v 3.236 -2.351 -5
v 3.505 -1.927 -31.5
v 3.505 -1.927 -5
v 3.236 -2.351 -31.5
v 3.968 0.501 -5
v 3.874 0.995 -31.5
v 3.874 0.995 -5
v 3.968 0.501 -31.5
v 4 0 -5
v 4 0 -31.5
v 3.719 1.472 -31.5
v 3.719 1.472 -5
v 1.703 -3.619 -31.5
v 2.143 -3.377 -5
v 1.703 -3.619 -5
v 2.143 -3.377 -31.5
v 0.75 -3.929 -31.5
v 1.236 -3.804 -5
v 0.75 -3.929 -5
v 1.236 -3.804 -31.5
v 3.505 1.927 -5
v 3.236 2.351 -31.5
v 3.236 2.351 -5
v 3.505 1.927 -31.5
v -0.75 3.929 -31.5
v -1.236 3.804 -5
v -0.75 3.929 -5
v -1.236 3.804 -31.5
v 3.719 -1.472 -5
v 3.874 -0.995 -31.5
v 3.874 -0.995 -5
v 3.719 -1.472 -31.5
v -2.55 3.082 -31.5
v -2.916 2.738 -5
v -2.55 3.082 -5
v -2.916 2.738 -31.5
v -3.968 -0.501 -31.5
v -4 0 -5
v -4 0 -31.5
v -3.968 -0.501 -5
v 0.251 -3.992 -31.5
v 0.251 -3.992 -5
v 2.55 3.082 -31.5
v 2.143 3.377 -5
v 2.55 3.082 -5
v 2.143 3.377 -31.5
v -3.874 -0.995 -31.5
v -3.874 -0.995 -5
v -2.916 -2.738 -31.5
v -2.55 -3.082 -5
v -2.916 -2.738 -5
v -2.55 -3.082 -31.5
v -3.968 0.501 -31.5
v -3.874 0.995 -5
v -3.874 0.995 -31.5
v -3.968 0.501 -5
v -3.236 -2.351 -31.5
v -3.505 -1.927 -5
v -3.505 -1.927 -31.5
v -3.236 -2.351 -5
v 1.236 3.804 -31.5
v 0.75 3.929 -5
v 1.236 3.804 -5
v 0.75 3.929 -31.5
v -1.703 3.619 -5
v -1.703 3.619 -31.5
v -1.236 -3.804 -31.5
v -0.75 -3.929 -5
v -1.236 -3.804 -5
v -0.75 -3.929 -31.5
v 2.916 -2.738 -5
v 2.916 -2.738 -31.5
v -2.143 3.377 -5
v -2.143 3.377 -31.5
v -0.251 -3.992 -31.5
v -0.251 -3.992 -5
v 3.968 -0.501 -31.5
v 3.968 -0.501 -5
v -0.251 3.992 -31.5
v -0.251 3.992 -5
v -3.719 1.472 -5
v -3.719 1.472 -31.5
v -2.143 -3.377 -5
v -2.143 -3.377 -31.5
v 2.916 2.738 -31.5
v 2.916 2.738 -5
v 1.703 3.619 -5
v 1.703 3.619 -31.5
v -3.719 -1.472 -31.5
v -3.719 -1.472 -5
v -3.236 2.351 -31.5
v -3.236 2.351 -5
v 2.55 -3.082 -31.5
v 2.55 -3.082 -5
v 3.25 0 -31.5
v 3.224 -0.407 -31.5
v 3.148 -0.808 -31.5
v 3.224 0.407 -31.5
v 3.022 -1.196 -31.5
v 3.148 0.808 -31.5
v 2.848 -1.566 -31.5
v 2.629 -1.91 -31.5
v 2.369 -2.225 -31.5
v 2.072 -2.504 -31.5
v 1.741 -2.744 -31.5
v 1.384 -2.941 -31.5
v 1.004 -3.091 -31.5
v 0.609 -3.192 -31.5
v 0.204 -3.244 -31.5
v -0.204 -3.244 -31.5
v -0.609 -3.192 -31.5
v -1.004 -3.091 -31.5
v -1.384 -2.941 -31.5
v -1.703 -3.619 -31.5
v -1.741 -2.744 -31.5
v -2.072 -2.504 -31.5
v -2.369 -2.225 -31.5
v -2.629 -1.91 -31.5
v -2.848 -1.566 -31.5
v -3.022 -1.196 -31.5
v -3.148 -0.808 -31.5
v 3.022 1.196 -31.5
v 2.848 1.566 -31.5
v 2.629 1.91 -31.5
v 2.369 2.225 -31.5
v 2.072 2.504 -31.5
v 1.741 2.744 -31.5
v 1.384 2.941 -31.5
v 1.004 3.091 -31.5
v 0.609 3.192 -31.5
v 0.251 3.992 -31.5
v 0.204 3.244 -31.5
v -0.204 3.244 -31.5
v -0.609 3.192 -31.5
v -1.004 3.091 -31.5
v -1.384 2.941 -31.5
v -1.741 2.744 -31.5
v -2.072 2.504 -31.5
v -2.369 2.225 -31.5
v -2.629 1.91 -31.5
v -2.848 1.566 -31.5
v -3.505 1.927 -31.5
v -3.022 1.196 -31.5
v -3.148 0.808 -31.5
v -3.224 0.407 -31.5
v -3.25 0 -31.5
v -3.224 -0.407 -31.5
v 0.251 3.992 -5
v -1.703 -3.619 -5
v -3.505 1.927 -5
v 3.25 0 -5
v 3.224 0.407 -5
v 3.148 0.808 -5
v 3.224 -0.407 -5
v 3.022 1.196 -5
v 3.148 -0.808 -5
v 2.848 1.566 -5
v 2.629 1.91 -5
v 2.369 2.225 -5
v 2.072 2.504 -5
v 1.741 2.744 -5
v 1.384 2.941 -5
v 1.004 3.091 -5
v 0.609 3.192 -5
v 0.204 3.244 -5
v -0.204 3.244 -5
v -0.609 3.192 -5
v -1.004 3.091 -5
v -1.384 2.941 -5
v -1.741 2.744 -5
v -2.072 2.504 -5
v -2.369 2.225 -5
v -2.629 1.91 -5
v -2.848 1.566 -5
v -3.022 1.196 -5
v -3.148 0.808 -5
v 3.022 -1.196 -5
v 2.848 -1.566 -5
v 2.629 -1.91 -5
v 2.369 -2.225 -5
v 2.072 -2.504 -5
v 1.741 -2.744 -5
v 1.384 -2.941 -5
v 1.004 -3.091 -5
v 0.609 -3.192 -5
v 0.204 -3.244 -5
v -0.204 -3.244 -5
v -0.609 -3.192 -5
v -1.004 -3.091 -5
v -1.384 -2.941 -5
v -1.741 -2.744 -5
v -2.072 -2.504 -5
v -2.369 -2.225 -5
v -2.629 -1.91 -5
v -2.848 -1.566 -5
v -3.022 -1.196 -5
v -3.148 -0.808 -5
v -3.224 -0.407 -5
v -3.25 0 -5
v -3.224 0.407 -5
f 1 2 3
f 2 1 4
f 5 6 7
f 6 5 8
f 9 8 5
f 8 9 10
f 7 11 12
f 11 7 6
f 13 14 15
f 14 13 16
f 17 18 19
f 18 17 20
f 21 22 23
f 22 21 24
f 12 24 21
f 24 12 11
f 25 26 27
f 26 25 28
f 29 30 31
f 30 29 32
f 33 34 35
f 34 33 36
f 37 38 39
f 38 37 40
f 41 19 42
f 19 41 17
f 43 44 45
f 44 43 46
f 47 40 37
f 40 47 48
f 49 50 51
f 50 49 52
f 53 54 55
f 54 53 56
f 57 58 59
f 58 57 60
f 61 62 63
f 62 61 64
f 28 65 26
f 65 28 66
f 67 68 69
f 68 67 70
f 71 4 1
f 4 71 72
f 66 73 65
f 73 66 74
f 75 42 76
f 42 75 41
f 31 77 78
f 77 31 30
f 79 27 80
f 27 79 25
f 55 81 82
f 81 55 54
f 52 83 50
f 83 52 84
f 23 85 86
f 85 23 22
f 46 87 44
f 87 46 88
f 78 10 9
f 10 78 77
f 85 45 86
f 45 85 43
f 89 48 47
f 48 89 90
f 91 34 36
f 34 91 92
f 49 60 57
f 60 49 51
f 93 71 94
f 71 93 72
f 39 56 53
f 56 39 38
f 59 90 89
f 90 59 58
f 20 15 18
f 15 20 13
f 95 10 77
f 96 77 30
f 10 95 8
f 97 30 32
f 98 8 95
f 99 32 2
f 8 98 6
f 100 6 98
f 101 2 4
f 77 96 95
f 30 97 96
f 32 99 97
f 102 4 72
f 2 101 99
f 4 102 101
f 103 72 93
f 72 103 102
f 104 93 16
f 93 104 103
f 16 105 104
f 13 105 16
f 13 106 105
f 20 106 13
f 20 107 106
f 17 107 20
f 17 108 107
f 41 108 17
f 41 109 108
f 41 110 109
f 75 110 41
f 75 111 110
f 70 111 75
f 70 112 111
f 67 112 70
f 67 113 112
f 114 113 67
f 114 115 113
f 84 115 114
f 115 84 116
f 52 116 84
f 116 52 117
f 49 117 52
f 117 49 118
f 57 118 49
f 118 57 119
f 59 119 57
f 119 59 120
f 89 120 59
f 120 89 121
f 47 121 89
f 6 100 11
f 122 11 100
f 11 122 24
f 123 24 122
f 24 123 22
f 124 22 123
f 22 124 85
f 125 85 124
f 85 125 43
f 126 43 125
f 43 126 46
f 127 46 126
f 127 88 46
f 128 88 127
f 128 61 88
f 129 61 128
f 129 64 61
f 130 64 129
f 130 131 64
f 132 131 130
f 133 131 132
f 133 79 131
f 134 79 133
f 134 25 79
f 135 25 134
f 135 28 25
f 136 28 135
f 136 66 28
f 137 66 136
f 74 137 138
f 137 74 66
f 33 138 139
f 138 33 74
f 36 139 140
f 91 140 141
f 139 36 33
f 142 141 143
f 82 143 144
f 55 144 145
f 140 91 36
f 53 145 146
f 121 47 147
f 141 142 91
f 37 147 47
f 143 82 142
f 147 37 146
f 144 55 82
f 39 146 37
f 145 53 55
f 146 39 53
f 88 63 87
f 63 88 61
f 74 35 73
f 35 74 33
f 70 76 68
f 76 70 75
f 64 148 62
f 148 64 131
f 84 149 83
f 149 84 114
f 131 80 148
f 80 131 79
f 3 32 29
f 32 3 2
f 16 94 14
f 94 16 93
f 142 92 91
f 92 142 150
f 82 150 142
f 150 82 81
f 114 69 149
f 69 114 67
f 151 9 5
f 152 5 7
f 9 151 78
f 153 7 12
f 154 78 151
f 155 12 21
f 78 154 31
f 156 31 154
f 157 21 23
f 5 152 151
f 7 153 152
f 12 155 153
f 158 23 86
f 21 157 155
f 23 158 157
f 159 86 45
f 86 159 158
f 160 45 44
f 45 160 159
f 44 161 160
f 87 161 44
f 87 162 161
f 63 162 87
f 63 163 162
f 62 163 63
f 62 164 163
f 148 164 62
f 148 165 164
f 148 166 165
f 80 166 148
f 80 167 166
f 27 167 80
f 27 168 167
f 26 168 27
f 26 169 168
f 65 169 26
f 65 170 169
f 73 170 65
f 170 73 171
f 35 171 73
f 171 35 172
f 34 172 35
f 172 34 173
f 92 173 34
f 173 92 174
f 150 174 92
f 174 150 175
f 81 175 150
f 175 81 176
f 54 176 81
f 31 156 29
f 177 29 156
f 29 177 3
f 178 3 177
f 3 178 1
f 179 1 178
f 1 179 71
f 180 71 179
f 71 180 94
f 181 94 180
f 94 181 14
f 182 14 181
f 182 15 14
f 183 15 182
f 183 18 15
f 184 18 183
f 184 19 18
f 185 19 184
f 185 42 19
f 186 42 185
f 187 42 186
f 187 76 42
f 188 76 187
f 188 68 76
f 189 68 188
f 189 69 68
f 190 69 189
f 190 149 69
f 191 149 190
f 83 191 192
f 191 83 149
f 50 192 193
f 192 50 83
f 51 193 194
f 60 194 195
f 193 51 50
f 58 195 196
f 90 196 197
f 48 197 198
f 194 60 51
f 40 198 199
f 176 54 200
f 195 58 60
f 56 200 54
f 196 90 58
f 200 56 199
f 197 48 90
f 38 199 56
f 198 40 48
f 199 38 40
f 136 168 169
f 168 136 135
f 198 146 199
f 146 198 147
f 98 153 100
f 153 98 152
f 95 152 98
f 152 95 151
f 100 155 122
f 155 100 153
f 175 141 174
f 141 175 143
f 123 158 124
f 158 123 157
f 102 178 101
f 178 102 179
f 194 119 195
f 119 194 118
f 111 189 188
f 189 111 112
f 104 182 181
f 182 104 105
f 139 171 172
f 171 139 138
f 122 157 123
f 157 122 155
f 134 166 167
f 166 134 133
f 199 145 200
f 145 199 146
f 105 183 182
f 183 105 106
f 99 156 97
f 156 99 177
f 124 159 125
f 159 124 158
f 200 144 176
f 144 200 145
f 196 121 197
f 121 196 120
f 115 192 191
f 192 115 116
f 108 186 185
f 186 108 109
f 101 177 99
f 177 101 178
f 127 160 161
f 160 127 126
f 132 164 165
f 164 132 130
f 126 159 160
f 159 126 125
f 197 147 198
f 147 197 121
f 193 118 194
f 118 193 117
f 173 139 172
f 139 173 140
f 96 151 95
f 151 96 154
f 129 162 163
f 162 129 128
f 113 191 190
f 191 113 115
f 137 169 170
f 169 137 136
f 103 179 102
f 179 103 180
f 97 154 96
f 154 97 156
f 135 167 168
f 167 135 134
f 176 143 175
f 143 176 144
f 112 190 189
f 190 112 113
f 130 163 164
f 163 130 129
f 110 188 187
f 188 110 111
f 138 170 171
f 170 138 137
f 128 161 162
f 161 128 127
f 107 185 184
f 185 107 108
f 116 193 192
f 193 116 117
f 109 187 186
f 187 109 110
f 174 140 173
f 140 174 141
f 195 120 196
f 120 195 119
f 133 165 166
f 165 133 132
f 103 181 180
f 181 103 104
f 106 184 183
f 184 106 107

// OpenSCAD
$fn = 50;

difference() {
	union() {
		translate(v = [0, 0, -31.5]) {
			cylinder(h = 34.5, r = 4.0);
		}
		#translate(v = [0, 0, -33.0]) {
			cylinder(h = 33, r = 2.875);
		}
	}
	union() {
		translate(v = [0, 0, 0]) {
			rotate(a = [0, 0, 0]) {
				difference() {
					union() {
						translate(v = [0, 0, -5]) {
							linear_extrude(height = 5) {
								polygon(points = [[5.914249999999999, 0.0], [2.957125, 5.1218907443321156], [-2.9571249999999982, 5.1218907443321156], [-5.914249999999999, 7.242867331857232e-16], [-2.9571250000000022, -5.121890744332115], [2.9571249999999956, -5.121890744332118]]);
							}
						}
					}
					union();
				}
			}
		}
		#cylinder(h = 3, r = 6.25);
		#translate(v = [0, 0, -100.0]) {
			cylinder(h = 200, r = 3.25);
		}
	}
}
